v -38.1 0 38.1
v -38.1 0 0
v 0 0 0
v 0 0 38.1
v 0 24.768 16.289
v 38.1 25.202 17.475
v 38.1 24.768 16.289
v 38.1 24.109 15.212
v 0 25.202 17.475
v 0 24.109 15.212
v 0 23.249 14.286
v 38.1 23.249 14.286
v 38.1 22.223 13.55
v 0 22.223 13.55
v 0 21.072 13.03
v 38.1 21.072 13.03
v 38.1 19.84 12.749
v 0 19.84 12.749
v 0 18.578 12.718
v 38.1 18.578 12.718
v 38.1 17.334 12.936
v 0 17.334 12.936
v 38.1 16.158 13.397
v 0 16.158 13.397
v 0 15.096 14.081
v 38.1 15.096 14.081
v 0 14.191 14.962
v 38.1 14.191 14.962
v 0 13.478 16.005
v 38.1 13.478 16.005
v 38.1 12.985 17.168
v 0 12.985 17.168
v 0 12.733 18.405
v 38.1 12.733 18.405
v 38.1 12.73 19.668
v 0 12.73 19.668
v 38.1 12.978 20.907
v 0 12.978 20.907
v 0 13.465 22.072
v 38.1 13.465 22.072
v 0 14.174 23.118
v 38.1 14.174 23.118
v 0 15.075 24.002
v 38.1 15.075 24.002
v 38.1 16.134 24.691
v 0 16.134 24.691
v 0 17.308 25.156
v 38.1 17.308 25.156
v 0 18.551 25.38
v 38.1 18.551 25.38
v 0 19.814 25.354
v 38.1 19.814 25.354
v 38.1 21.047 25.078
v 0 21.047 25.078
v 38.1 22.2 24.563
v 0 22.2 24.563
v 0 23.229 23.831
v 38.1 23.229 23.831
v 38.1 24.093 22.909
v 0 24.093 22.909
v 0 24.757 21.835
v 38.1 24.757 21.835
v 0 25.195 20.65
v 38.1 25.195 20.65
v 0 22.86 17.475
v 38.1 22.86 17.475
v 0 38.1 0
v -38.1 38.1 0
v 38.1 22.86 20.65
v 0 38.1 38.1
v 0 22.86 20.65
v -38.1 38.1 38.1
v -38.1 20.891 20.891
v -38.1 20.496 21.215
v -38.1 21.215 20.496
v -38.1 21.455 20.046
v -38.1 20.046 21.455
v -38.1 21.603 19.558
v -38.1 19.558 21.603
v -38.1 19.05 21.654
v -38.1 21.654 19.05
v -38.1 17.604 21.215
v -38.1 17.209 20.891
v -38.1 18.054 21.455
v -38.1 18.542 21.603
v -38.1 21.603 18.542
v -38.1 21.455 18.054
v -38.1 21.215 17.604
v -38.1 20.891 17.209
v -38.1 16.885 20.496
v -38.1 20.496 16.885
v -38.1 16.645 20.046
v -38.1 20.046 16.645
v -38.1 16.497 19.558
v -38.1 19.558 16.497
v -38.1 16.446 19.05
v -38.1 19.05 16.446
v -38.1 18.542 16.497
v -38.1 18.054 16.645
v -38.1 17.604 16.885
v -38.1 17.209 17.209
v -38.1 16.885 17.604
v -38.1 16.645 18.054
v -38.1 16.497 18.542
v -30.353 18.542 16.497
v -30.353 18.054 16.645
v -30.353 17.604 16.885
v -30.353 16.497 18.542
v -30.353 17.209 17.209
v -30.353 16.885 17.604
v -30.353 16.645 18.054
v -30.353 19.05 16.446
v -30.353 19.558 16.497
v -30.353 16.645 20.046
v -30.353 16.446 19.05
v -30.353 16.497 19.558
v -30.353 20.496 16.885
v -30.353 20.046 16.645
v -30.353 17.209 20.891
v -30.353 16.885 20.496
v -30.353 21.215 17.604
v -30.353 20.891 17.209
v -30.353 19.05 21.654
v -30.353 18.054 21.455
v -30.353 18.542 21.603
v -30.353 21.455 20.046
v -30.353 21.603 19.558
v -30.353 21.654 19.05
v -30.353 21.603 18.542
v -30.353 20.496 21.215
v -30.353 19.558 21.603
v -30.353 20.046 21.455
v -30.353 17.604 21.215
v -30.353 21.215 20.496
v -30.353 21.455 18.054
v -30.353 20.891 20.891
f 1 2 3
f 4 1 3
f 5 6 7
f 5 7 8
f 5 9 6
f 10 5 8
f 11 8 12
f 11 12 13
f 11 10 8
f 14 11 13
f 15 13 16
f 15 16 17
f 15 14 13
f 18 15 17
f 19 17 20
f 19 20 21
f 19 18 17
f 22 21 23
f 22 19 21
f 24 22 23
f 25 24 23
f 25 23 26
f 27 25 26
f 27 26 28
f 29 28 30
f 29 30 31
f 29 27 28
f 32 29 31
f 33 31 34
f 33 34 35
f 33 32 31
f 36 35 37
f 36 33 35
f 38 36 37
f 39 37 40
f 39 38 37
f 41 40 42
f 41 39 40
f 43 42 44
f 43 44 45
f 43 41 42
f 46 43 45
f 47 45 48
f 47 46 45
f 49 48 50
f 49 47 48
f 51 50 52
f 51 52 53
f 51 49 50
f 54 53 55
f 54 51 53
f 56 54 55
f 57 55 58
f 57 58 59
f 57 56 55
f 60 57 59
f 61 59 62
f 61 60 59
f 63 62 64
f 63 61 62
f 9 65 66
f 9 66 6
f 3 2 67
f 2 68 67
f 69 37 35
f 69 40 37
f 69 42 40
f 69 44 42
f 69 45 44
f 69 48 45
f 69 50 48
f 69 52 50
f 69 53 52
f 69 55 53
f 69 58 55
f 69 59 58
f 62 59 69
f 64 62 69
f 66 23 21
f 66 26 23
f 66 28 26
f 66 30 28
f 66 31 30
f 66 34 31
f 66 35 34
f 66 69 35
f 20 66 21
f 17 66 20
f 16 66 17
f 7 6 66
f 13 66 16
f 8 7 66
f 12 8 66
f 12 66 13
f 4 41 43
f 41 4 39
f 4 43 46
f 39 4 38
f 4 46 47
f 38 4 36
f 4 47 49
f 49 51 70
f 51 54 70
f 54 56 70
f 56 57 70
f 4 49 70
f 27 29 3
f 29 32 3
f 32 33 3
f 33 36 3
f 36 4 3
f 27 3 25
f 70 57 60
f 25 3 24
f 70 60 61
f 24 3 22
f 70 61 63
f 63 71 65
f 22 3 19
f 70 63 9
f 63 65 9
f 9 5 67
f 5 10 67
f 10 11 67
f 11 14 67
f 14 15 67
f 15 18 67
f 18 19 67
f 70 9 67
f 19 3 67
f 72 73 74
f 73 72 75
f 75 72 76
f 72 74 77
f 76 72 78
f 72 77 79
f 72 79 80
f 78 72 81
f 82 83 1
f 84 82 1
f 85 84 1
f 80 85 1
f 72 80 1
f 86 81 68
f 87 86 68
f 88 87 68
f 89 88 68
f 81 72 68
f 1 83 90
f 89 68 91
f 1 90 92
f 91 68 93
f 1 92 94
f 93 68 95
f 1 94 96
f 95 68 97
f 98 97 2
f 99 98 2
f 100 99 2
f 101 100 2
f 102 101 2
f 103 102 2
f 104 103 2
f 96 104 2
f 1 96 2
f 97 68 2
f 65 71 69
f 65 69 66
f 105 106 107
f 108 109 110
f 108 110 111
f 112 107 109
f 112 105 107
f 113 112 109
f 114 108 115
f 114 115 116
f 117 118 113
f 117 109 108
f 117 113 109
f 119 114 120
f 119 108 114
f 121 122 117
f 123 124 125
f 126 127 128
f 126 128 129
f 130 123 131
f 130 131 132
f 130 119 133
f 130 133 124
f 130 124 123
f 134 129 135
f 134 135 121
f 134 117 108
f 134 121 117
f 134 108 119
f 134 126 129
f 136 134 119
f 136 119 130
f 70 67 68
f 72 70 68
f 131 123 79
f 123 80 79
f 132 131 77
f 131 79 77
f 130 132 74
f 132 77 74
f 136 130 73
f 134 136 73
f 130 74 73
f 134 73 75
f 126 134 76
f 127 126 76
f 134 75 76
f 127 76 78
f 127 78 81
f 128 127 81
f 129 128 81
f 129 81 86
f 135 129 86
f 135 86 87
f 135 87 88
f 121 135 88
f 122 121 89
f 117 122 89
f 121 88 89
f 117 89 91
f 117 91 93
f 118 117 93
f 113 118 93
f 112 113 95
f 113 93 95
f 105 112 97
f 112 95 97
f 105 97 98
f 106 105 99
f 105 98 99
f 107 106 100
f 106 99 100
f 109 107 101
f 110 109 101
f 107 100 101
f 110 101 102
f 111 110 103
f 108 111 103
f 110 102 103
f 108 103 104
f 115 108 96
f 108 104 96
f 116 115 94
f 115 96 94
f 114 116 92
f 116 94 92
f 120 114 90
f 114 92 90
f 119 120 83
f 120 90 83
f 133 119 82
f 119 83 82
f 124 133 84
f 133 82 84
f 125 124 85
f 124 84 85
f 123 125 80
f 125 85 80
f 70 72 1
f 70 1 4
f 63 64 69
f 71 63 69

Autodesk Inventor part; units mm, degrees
ref_plane "YZ Plane" through (0, 0, 0) normal (1, 0, 0) x (0, 1, 0)
ref_plane "XZ Plane" through (0, 0, 0) normal (0, 1, 0) x (-1, 0, 0)
ref_plane "XY Plane" through (0, 0, 0) normal (0, 0, 1) x (1, 0, 0)
sketch "Sketch1" plane through (0, 0, 0) normal (0, 0, 1) x (1, 0, 0)
  line L0 (-38.1, 0) -> (0, 0)
  line L1 (0, 0) -> (0, 38.1)
  line L2 (0, 38.1) -> (-38.1, 38.1)
  line L3 (-38.1, 38.1) -> (-38.1, 0)
  dimension "d0" = 38.1
  dimension "d1" = 38.1
extrude "Extrusion1" add sketch "Sketch1" along normal blind 38.1
sketch "Sketch2" plane through (0, 0, 0) normal (1, 0, 0) x (0, 0, -1)
  line L0 (-38.1, 38.1) -> (-38.1, 0) projected
  line L1 (0, 0) -> (-38.1, 0) projected
  line L2 (0, 0) -> (0, 38.1) projected
  line L3 (0, 38.1) -> (-38.1, 38.1) projected
  line L4 (-38.1, 38.1) -> (-38.1, 0) projected
  line L5 (0, 0) -> (-38.1, 0) projected
  line L6 (0, 0) -> (0, 38.1) projected
  line L7 (0, 38.1) -> (-38.1, 38.1) projected
  circle A0 centre (-19.05, 19.05) radius 6.35
  dimension "d4" = 19.05
  dimension "d5" = 12.7
sketch "Sketch3" plane through (0, 0, 0) normal (1, 0, 0) x (0, 0, -1)
  line L0 (0, 38.1) -> (-38.1, 38.1) projected
  circle A0 centre (-19.05, 19.05) radius 6.35 projected
  line L1 (-20.6502, 25.1951) -> (-20.6502, 22.86)
  line L2 (-20.6502, 22.86) -> (-17.4752, 22.86)
  line L3 (-17.4752, 22.86) -> (-17.4752, 25.2016)
  point P0 (-19.05, 25.4)
  dimension "d6" = 1.6002
  dimension "d7" = 3.175
  dimension "d8" = 1.6002
  dimension "d9" = 2.54
extrude "Extrusion2" add sketch "Sketch3" along normal blind 38.1 contours A0 L1 L2 L3 picked at (-18.8789, 19.481)
sketch "Sketch4" plane through (-38.1, 0, 0) normal (-1, 0, 0) x (0, 0, 1)
  line L0 (38.1, 0) -> (38.1, 38.1) projected
  line L1 (0, 0) -> (38.1, 0) projected
  circle A0 centre (19.05, 19.05) radius 2.6035
  dimension "d12" = 19.05
  dimension "d13" = 19.05
  dimension "d14" = 5.207
extrude "Extrusion3" cut sketch "Sketch4" against normal blind 7.747
properties part number "BaneBots P60 4 to1 gearbox"
